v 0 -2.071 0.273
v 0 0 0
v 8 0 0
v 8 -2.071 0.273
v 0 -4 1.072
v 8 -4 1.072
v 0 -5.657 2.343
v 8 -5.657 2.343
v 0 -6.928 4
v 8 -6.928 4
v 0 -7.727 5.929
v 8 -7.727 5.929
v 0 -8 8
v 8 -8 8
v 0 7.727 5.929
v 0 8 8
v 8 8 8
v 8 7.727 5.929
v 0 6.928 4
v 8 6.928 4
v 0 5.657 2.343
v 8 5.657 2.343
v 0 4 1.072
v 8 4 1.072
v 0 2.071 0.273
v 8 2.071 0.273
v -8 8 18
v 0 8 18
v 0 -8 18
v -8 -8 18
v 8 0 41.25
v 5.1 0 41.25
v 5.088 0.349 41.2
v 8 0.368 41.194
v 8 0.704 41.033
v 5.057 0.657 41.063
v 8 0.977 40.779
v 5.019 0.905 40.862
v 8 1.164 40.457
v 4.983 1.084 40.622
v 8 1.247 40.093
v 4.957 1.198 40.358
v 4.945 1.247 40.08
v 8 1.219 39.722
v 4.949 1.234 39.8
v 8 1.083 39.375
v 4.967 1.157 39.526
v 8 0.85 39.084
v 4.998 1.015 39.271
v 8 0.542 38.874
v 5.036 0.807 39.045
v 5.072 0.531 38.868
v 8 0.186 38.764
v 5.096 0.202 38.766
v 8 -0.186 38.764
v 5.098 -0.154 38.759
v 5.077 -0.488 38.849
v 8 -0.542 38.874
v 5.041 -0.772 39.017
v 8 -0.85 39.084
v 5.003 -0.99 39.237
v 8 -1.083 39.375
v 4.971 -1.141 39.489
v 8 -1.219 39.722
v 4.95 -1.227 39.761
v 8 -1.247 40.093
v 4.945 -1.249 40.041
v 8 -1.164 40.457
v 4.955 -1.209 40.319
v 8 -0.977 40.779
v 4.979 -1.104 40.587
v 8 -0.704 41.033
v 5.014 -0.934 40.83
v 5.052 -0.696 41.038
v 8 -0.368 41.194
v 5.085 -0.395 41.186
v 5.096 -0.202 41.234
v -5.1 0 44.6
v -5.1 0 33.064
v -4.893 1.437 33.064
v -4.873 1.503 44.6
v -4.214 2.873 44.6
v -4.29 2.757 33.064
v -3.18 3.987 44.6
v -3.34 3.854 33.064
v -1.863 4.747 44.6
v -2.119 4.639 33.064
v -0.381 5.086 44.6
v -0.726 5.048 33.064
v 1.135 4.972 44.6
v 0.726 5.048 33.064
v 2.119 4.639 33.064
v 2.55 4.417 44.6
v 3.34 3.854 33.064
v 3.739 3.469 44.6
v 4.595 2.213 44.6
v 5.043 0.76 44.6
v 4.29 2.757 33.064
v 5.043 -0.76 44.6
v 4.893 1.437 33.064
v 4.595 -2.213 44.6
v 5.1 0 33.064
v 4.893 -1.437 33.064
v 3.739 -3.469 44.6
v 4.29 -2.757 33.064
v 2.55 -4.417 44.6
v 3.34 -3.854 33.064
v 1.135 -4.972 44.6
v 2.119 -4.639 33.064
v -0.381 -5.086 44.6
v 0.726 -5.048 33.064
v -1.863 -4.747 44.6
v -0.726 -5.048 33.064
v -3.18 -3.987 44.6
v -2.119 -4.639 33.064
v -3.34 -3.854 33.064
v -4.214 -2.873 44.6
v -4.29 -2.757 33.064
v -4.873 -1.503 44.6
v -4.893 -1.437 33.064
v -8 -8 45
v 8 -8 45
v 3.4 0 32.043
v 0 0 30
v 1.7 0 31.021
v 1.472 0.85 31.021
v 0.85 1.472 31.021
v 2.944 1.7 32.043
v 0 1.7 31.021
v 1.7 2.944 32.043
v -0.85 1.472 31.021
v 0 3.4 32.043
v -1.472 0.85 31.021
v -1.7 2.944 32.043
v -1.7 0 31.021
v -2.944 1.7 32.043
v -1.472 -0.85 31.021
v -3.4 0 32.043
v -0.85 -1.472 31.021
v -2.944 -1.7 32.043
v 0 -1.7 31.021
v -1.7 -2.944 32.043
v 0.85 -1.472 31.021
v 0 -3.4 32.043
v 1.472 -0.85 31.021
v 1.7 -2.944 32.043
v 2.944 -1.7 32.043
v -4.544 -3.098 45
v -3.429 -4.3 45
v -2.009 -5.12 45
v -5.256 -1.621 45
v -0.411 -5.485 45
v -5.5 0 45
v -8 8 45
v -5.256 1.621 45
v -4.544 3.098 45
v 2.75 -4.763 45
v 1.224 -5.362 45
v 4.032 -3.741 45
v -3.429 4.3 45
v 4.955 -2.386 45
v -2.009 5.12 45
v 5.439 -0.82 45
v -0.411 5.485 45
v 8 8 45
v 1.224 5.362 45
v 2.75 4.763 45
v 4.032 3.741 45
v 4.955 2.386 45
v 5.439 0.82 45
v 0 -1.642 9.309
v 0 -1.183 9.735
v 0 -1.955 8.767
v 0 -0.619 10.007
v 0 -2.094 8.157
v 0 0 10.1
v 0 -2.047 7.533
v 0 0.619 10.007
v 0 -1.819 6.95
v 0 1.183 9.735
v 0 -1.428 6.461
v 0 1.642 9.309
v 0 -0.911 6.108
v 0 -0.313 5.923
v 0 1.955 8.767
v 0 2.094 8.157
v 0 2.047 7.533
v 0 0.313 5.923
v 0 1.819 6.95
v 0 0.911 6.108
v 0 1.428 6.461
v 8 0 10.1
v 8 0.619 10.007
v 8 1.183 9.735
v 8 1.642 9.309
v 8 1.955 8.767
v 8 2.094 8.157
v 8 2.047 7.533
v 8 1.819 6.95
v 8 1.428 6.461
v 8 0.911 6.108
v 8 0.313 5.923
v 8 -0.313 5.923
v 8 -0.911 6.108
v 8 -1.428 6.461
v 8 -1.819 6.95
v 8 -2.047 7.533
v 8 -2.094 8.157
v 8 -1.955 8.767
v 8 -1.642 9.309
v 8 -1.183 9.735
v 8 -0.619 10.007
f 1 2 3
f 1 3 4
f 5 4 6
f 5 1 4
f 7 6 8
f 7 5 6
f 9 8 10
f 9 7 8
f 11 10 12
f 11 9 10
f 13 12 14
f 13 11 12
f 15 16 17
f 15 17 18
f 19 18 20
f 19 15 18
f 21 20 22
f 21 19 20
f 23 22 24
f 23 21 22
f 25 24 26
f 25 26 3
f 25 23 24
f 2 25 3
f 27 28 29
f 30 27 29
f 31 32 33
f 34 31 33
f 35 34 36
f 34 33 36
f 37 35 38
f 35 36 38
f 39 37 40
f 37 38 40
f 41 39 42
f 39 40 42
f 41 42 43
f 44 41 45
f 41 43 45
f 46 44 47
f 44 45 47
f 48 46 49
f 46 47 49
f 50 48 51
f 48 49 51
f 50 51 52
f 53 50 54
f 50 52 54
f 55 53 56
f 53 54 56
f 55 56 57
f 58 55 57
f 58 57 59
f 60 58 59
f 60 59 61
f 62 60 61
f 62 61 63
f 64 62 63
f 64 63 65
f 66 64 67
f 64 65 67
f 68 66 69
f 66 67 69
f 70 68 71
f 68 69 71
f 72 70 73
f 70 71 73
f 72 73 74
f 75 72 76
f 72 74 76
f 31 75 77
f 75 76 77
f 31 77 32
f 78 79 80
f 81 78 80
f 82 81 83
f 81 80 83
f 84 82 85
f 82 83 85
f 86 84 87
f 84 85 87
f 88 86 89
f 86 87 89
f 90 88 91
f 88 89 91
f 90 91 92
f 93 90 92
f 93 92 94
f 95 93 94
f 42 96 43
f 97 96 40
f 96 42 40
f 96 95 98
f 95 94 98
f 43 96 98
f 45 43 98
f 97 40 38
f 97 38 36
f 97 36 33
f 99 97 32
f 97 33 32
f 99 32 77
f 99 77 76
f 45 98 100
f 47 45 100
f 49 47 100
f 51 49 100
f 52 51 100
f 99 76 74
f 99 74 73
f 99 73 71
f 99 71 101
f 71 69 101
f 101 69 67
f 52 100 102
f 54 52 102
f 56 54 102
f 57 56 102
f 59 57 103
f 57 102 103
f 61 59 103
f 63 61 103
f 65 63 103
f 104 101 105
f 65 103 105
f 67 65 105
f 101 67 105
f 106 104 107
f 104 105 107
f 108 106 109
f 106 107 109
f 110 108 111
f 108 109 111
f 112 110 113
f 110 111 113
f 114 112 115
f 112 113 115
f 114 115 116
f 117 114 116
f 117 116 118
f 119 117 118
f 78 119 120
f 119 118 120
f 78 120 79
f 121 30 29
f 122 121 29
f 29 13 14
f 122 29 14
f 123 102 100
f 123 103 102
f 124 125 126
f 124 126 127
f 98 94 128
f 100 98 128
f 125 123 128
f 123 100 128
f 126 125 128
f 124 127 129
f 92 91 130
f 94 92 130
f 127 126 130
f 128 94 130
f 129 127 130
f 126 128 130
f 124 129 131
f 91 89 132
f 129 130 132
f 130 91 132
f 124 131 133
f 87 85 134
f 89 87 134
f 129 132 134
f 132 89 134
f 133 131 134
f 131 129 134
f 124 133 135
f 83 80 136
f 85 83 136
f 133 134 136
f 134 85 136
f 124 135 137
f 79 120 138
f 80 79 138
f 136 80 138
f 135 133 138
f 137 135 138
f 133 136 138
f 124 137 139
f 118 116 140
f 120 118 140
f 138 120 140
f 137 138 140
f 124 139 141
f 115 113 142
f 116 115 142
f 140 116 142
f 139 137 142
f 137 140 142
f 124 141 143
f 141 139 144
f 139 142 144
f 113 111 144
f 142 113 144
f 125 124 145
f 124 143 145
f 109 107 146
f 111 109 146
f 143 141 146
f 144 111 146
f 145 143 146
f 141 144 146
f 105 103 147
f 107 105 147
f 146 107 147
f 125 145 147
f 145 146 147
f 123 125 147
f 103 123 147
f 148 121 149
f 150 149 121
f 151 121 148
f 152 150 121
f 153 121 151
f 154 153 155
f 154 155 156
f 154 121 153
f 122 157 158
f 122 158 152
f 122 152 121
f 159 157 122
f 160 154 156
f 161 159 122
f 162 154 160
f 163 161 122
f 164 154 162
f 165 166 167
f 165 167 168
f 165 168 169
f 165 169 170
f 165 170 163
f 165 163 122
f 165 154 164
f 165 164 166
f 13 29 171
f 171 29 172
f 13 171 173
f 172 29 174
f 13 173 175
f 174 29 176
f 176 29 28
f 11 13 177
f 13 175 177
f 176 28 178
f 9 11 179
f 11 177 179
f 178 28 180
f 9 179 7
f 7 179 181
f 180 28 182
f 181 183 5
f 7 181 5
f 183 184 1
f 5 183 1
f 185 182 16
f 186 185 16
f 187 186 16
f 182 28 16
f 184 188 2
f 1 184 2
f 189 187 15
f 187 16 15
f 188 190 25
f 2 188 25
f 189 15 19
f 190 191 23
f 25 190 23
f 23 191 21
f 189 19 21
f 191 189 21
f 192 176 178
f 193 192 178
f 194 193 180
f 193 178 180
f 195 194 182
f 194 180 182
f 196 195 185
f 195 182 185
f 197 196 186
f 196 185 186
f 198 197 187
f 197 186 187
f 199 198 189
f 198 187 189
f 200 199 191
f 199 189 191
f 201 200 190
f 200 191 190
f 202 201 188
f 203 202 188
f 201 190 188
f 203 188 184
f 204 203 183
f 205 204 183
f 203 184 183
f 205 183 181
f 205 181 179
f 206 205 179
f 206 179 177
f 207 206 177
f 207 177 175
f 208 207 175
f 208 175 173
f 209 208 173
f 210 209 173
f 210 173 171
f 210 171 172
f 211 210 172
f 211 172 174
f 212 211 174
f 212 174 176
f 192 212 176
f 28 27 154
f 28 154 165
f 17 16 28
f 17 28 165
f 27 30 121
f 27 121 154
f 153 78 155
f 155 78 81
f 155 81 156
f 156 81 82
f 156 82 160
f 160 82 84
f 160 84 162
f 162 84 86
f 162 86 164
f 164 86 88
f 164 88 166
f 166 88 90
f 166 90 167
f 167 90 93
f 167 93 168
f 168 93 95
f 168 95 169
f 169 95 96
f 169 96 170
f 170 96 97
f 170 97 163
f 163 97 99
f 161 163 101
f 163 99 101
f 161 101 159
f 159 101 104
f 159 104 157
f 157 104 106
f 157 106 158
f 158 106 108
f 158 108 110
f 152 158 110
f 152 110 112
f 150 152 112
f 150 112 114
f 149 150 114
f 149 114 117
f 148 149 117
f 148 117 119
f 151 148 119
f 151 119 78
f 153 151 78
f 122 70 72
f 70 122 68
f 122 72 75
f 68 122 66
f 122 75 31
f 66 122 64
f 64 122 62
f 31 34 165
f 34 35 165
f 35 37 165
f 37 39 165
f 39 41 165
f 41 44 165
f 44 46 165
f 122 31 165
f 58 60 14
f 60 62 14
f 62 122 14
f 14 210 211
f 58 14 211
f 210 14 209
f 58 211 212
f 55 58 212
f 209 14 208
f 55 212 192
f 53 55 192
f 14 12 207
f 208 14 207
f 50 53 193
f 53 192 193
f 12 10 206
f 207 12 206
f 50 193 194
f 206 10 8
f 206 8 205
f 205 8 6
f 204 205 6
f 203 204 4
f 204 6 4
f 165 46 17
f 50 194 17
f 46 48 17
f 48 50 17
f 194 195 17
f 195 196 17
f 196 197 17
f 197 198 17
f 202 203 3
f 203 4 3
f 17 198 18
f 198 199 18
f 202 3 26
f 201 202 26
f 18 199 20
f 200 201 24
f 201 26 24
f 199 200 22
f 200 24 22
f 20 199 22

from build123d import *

# Parameters (mm, degrees)
SKETCH1_W                               = 16
SKETCH1_H                               = 16
BASE_DEPTH                              = 45
SKETCH3_W                               = 19.927362357
SKETCH3_H                               = 16
SLOTFORANOTHERPART_DEPTH                = 47.400431032
CHAMFERFORSLOT_DEPTH                    = 47.400431032
M5X0_8_TAPPED_HOLE_FOR_SLOTSCREW_D      = 4.2
M5X0_8_TAPPED_HOLE_FOR_SLOTSCREW_DEPTH  = 11.1381927
M5X0_8_TAPPED_HOLE_FOR_SLOTSCREW_TIP    = 1.2618073
M3X0_5_TAPPED_HOLE_FOR_ROD_FIXING_D     = 2.5
M3X0_5_TAPPED_HOLE_FOR_ROD_FIXING_DEPTH = 6.748924226
M3X0_5_TAPPED_HOLE_FOR_ROD_FIXING_TIP   = 0.751075774
F_10_2_10_2_ROD_HOLE_D                  = 10.2
F_10_2_10_2_ROD_HOLE_DEPTH              = 11.935610843
F_10_2_10_2_ROD_HOLE_CSINK_D            = 11
F_10_2_10_2_ROD_HOLE_CSINK_ANGLE        = 90
F_10_2_10_2_ROD_HOLE_TIP                = 3.064389157


with BuildPart() as part:
    # Sketch1 → Base (new body)
    with BuildSketch(Plane.XY):
        Rectangle(SKETCH1_W, SKETCH1_H)
    extrude(amount=BASE_DEPTH)

    # Sketch3 → SlotForAnotherPart (cut, through all)
    with BuildSketch(Plane(origin=(0, 0, 0), x_dir=(0, 0, -1), z_dir=(1, 0, 0))):
        with Locations((-8.036318822, 0)):
            Rectangle(SKETCH3_W, SKETCH3_H)
    extrude(amount=-SLOTFORANOTHERPART_DEPTH, mode=Mode.SUBTRACT)

    # Sketch3<3> → ChamferForSlot (cut, through all)
    with BuildSketch(Plane(origin=(0, 0, 0), x_dir=(0, 0, -1), z_dir=(1, 0, 0))):
        with BuildLine():
            Line((1.927362357, 8), (-8.000000039, 8))
            ThreePointArc((-8.000000039, 8), (-2.343145764, 5.656854263), (0, 0))
            ThreePointArc((0, 0), (-2.343145751, -5.656854249), (-8, -8))
            Line((-8, -8), (1.927362357, -8))
            Line((1.927362357, -8), (1.927362357, 8))
        make_face()
    extrude(amount=CHAMFERFORSLOT_DEPTH, mode=Mode.SUBTRACT)

    # M5x0.8 Tapped Hole for SlotScrew
    with Locations(Plane(origin=(8, 0, 0), x_dir=(0, 0, -1), z_dir=(1, 0, 0))):
        with Locations((-8, 0)):
            Hole(M5X0_8_TAPPED_HOLE_FOR_SLOTSCREW_D / 2, depth=M5X0_8_TAPPED_HOLE_FOR_SLOTSCREW_DEPTH)
            with Locations((0, 0, -(M5X0_8_TAPPED_HOLE_FOR_SLOTSCREW_DEPTH + M5X0_8_TAPPED_HOLE_FOR_SLOTSCREW_TIP / 2))):  # 118° drill point
                Cone(0, M5X0_8_TAPPED_HOLE_FOR_SLOTSCREW_D / 2, M5X0_8_TAPPED_HOLE_FOR_SLOTSCREW_TIP, mode=Mode.SUBTRACT)

    # M3x0.5 Tapped Hole for Rod Fixing
    with Locations(Plane(origin=(8, 0, 0), x_dir=(0, 0, -1), z_dir=(1, 0, 0))):
        with Locations((-40, 0)):
            Hole(M3X0_5_TAPPED_HOLE_FOR_ROD_FIXING_D / 2, depth=M3X0_5_TAPPED_HOLE_FOR_ROD_FIXING_DEPTH)
            with Locations((0, 0, -(M3X0_5_TAPPED_HOLE_FOR_ROD_FIXING_DEPTH + M3X0_5_TAPPED_HOLE_FOR_ROD_FIXING_TIP / 2))):  # 118° drill point
                Cone(0, M3X0_5_TAPPED_HOLE_FOR_ROD_FIXING_D / 2, M3X0_5_TAPPED_HOLE_FOR_ROD_FIXING_TIP, mode=Mode.SUBTRACT)

    # Ø10.2 (10.2) Rod Hole
    with Locations(Plane.XY.offset(45)):
        with Locations((0, 0)):
            CounterSinkHole(F_10_2_10_2_ROD_HOLE_D / 2, F_10_2_10_2_ROD_HOLE_CSINK_D / 2, depth=F_10_2_10_2_ROD_HOLE_DEPTH, counter_sink_angle=F_10_2_10_2_ROD_HOLE_CSINK_ANGLE)
            with Locations((0, 0, -(F_10_2_10_2_ROD_HOLE_DEPTH + F_10_2_10_2_ROD_HOLE_TIP / 2))):  # 118° drill point
                Cone(0, F_10_2_10_2_ROD_HOLE_D / 2, F_10_2_10_2_ROD_HOLE_TIP, mode=Mode.SUBTRACT)


solid = part.part
